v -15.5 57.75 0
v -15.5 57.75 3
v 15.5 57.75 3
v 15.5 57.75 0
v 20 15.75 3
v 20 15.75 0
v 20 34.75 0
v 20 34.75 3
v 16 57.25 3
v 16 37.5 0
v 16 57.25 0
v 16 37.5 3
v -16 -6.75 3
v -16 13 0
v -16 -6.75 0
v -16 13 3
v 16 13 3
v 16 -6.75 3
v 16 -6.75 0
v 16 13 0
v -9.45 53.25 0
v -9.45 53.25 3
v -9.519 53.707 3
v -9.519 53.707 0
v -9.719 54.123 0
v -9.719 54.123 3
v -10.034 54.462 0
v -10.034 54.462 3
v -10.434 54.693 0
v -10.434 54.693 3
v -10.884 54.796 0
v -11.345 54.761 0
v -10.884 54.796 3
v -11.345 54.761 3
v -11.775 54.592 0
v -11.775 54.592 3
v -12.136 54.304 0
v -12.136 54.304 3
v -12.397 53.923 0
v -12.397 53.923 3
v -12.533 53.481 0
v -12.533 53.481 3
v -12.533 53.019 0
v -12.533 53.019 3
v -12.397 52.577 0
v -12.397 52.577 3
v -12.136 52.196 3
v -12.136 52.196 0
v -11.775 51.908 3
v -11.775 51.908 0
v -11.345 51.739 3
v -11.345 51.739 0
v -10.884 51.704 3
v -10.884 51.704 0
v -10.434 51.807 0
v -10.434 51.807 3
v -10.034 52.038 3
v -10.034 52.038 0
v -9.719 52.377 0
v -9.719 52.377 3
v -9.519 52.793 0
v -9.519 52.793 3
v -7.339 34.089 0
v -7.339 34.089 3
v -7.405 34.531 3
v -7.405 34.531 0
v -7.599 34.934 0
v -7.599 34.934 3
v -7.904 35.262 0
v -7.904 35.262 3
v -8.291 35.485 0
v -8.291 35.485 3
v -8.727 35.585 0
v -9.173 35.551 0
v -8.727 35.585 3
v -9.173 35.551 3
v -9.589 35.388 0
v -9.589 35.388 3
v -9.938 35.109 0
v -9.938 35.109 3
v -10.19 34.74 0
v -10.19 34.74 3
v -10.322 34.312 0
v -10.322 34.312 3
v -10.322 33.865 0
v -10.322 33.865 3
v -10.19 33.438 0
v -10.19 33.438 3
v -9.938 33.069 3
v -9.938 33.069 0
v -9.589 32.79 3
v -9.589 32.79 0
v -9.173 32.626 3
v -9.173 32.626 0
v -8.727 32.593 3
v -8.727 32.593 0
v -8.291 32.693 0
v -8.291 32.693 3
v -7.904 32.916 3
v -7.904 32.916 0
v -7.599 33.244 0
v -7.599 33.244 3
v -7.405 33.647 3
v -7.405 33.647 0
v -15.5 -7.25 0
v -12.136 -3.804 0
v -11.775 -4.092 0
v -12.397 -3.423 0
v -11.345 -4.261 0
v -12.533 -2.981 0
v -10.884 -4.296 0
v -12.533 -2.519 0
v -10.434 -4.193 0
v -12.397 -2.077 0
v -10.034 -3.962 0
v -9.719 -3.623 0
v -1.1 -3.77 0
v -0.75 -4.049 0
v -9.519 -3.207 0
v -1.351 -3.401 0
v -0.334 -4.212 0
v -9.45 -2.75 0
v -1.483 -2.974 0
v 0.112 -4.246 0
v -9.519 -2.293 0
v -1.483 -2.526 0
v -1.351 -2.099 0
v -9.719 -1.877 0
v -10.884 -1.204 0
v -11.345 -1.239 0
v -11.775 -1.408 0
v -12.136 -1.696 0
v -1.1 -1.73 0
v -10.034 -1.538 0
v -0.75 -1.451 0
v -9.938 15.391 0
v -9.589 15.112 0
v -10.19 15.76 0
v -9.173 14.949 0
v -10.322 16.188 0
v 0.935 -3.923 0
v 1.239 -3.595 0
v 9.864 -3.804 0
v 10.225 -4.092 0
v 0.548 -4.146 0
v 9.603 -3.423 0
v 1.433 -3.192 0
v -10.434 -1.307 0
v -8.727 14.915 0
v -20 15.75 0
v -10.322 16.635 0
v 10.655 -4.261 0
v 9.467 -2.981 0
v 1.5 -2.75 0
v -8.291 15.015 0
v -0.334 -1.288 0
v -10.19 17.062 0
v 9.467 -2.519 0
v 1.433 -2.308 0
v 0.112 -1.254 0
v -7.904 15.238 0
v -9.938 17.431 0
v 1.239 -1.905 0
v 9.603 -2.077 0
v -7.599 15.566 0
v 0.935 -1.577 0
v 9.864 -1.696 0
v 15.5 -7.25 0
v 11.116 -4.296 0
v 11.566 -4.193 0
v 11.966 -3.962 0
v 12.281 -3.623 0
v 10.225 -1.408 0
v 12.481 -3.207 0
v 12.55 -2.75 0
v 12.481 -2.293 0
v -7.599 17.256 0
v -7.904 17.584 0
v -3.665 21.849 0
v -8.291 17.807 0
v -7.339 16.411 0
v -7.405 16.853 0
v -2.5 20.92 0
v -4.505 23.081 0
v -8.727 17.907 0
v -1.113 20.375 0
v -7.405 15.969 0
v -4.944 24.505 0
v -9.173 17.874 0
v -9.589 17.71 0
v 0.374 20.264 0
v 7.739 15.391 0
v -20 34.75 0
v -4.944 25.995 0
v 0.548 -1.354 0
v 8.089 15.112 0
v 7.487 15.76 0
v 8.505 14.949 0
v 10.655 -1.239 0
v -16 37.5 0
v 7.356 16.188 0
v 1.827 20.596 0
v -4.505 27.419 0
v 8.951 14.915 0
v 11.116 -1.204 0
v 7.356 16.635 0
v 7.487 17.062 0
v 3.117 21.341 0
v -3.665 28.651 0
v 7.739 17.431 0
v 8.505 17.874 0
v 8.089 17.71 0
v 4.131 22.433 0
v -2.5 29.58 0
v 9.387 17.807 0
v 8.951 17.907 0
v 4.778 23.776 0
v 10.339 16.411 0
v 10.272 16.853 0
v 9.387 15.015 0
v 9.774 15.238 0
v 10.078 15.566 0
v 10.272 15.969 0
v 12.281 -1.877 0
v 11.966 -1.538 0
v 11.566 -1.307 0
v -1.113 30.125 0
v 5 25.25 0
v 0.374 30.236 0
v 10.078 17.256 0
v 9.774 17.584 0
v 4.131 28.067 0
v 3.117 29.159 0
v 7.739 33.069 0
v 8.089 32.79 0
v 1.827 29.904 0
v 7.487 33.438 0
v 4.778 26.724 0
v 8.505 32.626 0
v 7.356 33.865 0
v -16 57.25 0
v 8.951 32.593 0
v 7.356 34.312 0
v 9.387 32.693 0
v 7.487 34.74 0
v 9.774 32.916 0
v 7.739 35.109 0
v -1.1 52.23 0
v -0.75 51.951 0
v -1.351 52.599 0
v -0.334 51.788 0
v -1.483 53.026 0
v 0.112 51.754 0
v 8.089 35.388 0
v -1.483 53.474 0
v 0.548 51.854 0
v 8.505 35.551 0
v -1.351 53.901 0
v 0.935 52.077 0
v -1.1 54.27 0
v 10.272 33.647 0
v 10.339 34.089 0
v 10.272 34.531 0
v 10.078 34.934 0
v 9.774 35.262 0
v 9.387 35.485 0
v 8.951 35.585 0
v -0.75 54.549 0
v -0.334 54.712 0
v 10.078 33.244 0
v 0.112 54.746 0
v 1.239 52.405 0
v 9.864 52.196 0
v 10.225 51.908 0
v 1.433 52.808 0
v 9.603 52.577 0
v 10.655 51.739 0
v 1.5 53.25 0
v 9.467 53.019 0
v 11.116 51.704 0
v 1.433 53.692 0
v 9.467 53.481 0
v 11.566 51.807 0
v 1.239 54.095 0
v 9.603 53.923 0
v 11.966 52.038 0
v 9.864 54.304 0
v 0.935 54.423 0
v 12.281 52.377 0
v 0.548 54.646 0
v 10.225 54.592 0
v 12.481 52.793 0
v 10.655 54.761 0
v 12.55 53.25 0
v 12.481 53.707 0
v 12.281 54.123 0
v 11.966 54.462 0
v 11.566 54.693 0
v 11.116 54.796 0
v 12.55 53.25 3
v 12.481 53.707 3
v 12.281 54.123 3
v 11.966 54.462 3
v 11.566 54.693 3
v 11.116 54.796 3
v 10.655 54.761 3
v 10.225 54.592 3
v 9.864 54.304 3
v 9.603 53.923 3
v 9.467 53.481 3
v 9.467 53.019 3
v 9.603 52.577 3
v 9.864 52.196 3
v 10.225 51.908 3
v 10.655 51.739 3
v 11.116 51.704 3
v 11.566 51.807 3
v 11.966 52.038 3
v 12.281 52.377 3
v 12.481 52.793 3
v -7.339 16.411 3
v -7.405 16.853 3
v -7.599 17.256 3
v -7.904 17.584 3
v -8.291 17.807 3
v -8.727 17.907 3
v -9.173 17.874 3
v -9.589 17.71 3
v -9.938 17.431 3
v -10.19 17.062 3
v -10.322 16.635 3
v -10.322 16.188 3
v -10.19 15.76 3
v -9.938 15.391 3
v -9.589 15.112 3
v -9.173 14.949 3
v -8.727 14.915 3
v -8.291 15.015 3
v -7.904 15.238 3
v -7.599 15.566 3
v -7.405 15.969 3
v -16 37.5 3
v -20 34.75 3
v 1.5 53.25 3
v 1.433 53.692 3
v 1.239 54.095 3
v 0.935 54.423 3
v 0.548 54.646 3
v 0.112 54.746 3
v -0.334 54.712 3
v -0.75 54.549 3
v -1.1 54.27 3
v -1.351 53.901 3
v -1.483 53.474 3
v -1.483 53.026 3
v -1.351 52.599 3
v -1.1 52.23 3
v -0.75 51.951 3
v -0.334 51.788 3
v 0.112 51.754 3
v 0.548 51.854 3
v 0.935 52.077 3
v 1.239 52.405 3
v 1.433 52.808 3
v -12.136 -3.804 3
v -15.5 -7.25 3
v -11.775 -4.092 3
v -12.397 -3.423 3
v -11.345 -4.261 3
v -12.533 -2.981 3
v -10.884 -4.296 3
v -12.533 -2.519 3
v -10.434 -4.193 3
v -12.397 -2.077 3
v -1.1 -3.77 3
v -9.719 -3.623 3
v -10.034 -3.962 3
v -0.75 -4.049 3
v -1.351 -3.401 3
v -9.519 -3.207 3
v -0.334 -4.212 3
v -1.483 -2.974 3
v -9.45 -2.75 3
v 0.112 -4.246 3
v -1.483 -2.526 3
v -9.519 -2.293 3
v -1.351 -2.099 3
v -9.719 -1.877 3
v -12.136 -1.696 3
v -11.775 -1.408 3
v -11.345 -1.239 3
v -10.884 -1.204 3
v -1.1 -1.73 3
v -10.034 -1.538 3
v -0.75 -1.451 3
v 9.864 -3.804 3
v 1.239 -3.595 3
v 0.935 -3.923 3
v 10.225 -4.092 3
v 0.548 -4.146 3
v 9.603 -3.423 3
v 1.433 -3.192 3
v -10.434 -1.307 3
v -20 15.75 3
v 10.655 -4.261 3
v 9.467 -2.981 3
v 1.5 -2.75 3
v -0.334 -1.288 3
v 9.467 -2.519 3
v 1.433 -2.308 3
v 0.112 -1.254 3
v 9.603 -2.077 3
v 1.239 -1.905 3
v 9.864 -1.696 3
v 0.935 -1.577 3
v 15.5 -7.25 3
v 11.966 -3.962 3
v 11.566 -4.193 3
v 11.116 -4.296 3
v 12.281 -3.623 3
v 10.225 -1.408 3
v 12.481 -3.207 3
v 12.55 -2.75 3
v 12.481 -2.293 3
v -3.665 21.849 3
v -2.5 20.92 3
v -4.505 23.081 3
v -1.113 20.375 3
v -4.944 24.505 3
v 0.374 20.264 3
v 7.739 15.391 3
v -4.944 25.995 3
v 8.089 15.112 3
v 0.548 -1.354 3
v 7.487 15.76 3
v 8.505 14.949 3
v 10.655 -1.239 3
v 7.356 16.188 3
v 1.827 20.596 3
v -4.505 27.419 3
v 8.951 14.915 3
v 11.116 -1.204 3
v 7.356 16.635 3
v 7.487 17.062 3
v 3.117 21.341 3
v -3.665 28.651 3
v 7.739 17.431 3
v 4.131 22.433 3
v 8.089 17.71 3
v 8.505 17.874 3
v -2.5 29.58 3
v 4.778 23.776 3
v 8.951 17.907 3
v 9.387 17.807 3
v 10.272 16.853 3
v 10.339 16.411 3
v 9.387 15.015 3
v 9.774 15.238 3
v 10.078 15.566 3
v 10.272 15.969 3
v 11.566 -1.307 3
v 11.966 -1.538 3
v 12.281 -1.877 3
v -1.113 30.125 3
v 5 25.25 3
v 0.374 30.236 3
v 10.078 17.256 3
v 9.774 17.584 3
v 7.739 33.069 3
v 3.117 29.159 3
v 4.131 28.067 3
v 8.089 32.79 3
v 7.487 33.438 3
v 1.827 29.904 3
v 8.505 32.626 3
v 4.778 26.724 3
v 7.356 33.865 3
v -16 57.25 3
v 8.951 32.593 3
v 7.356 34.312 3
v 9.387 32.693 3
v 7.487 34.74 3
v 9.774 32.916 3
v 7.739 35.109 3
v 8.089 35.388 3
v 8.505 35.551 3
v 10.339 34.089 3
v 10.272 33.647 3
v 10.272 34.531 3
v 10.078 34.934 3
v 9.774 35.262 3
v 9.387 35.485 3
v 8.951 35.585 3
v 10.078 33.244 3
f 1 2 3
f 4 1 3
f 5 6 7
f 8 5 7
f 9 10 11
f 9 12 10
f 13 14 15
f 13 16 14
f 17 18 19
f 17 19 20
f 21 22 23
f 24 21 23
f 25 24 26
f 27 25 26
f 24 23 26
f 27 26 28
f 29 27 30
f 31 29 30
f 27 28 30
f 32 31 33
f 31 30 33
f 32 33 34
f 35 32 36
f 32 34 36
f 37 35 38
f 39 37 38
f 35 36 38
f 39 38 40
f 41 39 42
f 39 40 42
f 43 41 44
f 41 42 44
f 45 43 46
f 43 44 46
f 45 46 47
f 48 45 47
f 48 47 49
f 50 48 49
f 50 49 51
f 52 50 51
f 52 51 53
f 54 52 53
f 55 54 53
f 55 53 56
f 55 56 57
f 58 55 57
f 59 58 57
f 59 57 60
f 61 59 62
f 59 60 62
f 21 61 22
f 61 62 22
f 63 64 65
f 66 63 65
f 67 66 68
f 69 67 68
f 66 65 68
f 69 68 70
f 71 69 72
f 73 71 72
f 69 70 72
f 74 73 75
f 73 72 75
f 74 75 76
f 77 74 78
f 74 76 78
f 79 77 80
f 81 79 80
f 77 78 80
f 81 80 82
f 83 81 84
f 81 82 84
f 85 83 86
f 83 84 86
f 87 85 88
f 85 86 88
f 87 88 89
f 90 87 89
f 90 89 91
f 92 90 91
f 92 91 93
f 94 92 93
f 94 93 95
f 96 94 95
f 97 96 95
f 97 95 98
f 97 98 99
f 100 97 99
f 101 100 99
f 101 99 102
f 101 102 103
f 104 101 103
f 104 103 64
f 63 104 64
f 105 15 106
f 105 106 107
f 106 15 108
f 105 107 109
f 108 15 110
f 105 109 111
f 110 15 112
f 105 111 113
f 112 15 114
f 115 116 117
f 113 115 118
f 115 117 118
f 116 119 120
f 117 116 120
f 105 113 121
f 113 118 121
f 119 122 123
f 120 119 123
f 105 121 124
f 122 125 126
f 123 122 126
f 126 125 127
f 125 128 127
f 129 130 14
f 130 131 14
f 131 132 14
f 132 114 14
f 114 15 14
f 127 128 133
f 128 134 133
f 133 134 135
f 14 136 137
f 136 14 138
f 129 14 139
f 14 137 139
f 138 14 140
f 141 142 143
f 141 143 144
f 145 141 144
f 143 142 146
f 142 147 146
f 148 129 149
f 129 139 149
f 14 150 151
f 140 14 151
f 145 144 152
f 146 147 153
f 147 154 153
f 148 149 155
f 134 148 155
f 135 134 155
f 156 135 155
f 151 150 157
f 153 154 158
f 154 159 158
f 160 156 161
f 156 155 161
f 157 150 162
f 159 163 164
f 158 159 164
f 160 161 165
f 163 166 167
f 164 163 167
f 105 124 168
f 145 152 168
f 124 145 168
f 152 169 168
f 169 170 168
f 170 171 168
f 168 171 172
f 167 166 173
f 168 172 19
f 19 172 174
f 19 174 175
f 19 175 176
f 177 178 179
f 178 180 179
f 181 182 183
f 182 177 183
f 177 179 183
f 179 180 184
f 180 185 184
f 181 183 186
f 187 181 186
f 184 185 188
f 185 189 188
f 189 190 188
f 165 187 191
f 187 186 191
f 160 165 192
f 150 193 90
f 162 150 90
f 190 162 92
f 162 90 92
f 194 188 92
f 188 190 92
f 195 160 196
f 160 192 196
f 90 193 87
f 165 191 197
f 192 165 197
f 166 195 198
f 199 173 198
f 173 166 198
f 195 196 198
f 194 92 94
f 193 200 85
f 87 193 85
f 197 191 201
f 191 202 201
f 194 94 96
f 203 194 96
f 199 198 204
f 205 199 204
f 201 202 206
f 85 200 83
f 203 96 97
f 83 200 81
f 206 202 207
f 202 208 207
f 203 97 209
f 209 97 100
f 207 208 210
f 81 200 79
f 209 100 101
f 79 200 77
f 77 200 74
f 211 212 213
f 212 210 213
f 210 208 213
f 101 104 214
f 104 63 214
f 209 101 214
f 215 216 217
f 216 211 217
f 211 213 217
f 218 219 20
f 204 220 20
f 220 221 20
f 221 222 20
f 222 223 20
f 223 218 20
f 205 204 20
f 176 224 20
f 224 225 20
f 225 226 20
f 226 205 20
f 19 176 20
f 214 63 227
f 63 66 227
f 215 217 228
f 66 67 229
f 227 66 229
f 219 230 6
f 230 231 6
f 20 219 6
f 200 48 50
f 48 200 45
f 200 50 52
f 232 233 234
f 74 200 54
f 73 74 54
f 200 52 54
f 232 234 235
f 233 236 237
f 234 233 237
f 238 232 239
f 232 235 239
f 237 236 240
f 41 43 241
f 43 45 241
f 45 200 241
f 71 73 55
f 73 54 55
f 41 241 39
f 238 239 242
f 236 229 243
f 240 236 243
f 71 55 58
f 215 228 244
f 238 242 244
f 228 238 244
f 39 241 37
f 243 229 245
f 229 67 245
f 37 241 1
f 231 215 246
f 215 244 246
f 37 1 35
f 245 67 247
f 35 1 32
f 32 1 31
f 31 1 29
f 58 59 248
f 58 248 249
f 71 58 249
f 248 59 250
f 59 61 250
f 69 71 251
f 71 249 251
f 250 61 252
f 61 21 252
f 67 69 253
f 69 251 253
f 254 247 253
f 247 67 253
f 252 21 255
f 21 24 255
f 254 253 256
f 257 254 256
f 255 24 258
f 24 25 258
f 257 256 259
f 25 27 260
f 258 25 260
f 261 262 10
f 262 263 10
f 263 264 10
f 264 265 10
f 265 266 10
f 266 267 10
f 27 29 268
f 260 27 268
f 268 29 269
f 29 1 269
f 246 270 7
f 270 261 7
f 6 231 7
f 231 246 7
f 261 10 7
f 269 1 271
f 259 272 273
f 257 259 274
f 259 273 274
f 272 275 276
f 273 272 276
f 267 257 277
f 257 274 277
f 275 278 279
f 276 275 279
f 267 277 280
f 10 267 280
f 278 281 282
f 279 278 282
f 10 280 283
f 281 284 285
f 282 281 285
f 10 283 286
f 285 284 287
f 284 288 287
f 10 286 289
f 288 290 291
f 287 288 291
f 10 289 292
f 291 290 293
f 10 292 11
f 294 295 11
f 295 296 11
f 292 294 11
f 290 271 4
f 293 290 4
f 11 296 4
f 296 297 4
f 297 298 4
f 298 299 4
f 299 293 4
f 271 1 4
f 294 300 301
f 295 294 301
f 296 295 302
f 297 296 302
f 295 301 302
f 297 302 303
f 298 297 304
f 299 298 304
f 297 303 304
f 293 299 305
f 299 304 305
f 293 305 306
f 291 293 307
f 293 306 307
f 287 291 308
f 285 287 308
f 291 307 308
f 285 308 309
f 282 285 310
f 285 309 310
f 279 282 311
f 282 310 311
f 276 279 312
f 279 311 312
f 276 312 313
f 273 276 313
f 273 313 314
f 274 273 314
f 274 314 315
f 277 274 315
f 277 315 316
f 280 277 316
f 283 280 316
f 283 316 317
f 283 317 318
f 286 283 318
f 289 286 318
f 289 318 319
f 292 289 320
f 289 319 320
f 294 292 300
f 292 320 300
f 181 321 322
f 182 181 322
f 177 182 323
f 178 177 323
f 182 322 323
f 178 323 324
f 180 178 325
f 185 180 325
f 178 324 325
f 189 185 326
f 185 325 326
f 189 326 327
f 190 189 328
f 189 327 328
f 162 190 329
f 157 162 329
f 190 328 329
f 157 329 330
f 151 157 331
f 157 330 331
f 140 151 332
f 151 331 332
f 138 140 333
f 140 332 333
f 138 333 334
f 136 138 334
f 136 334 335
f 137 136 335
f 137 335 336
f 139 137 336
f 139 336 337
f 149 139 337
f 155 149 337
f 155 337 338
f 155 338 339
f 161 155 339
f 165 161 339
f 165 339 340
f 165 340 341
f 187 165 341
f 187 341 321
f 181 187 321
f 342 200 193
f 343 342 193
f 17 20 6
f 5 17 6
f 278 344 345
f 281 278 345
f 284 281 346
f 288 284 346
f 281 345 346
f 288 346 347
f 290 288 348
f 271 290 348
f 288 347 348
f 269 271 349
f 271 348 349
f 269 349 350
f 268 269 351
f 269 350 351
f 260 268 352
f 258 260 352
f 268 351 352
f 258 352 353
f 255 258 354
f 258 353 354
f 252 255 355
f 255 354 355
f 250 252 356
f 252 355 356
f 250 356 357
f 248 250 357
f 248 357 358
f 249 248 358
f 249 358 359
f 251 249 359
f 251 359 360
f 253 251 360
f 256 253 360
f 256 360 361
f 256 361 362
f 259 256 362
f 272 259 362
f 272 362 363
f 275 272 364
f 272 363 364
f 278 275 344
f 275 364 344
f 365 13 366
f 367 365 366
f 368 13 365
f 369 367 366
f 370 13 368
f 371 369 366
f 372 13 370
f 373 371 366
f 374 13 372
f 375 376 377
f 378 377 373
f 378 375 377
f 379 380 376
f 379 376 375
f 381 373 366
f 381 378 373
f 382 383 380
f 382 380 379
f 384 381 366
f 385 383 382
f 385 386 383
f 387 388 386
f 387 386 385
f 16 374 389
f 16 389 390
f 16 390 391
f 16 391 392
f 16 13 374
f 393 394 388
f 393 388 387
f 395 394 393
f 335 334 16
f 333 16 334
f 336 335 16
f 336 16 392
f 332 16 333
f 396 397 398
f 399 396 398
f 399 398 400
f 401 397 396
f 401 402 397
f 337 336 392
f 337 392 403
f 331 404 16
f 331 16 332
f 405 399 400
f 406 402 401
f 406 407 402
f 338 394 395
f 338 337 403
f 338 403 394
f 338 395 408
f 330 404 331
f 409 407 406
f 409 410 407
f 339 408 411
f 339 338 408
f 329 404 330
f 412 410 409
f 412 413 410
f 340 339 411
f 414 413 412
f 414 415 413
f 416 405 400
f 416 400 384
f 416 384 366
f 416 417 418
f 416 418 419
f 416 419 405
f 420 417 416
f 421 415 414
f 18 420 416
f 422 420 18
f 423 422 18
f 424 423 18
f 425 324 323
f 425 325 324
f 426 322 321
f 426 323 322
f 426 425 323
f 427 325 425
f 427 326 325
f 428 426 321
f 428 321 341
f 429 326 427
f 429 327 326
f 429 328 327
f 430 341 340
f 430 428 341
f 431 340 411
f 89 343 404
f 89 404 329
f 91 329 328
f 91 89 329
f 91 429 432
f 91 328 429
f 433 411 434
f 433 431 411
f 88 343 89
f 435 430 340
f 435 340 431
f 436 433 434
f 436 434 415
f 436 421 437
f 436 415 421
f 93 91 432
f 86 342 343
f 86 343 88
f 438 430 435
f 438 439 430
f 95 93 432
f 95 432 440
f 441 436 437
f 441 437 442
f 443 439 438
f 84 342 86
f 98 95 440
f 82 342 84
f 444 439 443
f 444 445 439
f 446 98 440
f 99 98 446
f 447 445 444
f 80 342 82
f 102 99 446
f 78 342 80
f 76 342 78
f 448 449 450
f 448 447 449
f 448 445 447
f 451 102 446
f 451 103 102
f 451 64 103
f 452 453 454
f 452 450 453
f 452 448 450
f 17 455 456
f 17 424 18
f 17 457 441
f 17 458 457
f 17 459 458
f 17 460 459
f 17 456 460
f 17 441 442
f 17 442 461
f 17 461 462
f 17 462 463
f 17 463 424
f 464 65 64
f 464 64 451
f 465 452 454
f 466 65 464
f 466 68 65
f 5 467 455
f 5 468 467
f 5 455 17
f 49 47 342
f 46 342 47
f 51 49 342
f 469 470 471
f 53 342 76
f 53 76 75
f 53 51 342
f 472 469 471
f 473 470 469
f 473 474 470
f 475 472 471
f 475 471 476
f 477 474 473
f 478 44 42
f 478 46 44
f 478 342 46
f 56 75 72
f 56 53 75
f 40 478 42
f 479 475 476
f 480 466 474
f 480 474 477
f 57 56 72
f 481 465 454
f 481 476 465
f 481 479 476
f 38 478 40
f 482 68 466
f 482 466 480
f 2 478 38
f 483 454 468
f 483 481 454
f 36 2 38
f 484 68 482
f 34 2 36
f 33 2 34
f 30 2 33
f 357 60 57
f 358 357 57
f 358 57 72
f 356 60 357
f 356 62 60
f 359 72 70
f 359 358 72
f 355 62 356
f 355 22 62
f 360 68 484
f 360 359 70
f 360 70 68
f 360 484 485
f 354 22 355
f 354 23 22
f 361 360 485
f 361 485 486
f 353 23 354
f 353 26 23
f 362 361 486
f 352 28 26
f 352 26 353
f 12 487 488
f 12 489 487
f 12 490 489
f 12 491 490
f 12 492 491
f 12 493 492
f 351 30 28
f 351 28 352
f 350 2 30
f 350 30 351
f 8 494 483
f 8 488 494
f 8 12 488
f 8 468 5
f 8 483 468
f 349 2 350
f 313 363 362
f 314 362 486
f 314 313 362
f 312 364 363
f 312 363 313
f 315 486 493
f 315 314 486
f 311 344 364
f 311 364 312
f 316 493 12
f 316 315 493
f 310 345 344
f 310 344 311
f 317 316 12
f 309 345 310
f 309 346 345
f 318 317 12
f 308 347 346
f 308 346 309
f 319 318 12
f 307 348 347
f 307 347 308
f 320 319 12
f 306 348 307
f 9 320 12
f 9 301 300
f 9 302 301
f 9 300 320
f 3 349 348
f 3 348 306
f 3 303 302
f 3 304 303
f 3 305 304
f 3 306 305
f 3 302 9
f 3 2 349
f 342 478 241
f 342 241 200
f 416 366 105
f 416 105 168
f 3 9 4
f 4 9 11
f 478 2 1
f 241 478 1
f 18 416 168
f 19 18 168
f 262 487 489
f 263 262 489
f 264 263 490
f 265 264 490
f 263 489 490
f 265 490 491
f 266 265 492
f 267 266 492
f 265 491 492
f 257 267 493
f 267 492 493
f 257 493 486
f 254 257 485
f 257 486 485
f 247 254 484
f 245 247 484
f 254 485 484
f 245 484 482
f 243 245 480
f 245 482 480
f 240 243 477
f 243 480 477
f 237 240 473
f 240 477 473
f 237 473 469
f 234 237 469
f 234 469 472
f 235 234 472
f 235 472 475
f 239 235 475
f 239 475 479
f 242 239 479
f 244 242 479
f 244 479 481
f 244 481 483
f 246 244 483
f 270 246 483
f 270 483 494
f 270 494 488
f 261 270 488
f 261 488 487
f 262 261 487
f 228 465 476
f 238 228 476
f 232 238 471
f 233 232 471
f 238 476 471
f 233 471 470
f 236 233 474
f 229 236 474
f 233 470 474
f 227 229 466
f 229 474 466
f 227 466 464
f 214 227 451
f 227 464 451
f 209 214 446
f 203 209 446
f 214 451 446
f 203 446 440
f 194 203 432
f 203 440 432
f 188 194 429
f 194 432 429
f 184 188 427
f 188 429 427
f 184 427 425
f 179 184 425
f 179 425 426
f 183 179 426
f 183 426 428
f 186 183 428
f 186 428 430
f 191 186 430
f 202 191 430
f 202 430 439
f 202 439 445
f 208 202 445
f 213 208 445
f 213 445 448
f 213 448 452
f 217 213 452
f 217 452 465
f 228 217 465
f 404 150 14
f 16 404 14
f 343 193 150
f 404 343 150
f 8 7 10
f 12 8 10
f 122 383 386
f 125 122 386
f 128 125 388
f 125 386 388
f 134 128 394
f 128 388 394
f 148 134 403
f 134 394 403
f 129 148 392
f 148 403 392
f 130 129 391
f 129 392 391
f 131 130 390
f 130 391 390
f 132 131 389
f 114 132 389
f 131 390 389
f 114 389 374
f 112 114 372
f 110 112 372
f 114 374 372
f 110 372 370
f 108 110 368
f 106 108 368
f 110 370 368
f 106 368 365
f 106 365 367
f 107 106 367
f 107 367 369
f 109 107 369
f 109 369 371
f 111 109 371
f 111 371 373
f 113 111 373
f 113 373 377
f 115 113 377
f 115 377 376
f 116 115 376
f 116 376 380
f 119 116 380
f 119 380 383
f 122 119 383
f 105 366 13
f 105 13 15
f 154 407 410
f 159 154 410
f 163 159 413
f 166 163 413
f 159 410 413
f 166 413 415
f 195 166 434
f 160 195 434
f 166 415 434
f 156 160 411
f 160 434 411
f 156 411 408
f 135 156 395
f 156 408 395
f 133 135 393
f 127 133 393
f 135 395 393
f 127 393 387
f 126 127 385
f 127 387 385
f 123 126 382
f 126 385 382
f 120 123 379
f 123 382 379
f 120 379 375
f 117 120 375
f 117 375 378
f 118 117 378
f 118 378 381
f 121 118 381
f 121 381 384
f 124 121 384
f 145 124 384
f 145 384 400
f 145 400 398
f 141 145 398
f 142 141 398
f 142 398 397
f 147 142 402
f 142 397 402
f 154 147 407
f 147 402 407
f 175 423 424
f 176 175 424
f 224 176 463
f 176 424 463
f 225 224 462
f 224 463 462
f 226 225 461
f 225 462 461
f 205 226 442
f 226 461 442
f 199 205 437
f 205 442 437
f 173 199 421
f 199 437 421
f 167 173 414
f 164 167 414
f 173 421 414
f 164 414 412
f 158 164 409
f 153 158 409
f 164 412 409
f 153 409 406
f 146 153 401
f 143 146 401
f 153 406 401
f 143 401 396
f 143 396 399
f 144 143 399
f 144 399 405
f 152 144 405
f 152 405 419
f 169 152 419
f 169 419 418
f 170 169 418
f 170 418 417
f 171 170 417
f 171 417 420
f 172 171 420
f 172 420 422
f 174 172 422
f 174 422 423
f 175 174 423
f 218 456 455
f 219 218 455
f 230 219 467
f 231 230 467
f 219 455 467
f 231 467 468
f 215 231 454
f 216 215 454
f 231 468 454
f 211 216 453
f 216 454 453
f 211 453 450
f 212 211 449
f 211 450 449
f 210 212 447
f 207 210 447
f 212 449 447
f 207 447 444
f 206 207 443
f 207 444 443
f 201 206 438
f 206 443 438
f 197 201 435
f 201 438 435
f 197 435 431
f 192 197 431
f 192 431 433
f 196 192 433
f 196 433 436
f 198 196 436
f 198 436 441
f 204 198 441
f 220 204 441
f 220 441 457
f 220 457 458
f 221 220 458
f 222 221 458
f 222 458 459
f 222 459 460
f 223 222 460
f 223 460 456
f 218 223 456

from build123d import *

# Parameters (mm, degrees)
IZIM1_R                      = 1
Y_KSEKLIK_EKSTR_ZYON1_DEPTH  = 3
KES_EKSTR_ZYON1_DEPTH        = 10
Y_KSEKLIK_EKSTR_ZYON2_DEPTH  = 3
IZIM6_R                      = 1.55
Y_KSEKLIK_EKSTR_ZYON4_DEPTH  = 3
IZIM9_W                      = 2.764853826
IZIM9_H                      = 2.899724745
IZIM9_W_2                    = 2.53555673
IZIM9_H_2                    = 2.630505748
Y_KSEKLIK_EKSTR_ZYON5_DEPTH  = 3
IZIM8_R                      = 1.55
Y_KSEKLIK_EKSTR_ZYON6_DEPTH  = 3
IZIM10_R                     = 1.55
KES_EKSTR_ZYON2_DEPTH        = 10
IZIM14_R                     = 1.5
KES_EKSTR_ZYON3_DEPTH        = 10
IZIM15_R                     = 5
KES_EKSTR_ZYON4_DEPTH        = 10
Y_KSEKLIK_EKSTR_ZYON7_DEPTH  = 3
KES_EKSTR_ZYON5_DEPTH        = 3
IZIM23_R                     = 1.55
KES_EKSTR_ZYON6_DEPTH        = 3
IZIM25_R                     = 1.5
KES_EKSTR_ZYON7_DEPTH        = 3
Y_KSEKLIK_EKSTR_ZYON8_DEPTH  = 3
IZIM27_W                     = 26
IZIM27_H                     = 10
Y_KSEKLIK_EKSTR_ZYON9_DEPTH  = 3
IZIM28_W                     = 32
IZIM28_H                     = 10.183470431
KES_EKSTR_ZYON8_DEPTH        = 10
IZIM29_W                     = 21.597894427
IZIM29_H                     = 9.610197834
Y_KSEKLIK_EKSTR_ZYON11_DEPTH = 3
IZIM30_W                     = 32
IZIM30_H                     = 0.75
IZIM30_H_2                   = 0.5
KES_EKSTR_ZYON9_DEPTH        = 10
PAH1_SIZE                    = 0.5


with BuildPart() as part:
    # Çizim1 → Yükseklik-Ekstrüzyon1 (new body)
    # profile 1 of 2: a face of its own
    with BuildSketch(Plane.XY):
        Polygon((7.5, 49.5), (0, 49.5), (0, 46.25495549), (3, 46.25495549), (3.494974747, 46.749930237), (5.494974747, 46.749930237), (8.5, 44.749930237), (8.5, 43.249930237), (8.5, 41.749930237), (5.494974747, 39.749930237), (3.494974747, 39.749930237), (3, 40.244904984), (0, 40.244904984), (0, -51.5), (8.5, -51.5), (13.25, -48.202566926), (13.25, -43.75), (12.5, -43), (12.5, -35), (13.25, -34.25), (13.25, -28.25), (12.5, -27.5), (12.5, -19.5), (13.25, -18.75), (13.25, -12.75), (12.5, -12), (12.5, -4), (14, -2.5), (14, -2), (16, 0), (16, 13), (20, 15.75), (20, 33.5), (20, 34.75), (16, 37.5), (16, 47.5), (12, 51.5), (9.5, 51.5), align=None)
        Polygon((2.624434095, -42.600069763), (3.119408841, -42.105095016), (3.119408841, -36.105095016), (2.624434095, -35.610120269), (2.624434095, -33.610120269), (4.624434095, -30.605095016), (6.124434095, -30.605095016), (7.624434095, -30.605095016), (9.624434095, -33.610120269), (9.624434095, -35.610120269), (9.129459348, -36.105095016), (9.129459348, -42.105095016), (9.624434095, -42.600069763), (9.624434095, -44.600069763), (7.624434095, -47.605095016), (6.124434095, -47.605095016), (4.624434095, -47.605095016), (2.624434095, -44.600069763), align=None, mode=Mode.SUBTRACT)
        Polygon((4.624434095, -7.305095016), (6.124434095, -7.305095016), (7.624434095, -7.305095016), (9.624434095, -10.310120269), (9.624434095, -12.310120269), (9.129459348, -12.805095016), (9.129459348, -18.805095016), (9.624434095, -19.300069763), (9.624434095, -21.300069763), (7.624434095, -24.305095016), (6.124434095, -24.305095016), (4.624434095, -24.305095016), (2.624434095, -21.300069763), (2.624434095, -19.300069763), (3.119408841, -18.805095016), (3.119408841, -12.805095016), (2.624434095, -12.310120269), (2.624434095, -10.310120269), align=None, mode=Mode.SUBTRACT)
        with Locations((11, -0.75)):
            Circle(IZIM1_R, mode=Mode.SUBTRACT)
        with Locations((11, 48.25)):
            Circle(IZIM1_R, mode=Mode.SUBTRACT)
    # profile 2 of 2: a face of its own
    with BuildSketch(Plane.XY):
        Polygon((-9.5, 51.5), (-12, 51.5), (-16, 47.5), (-16, 37.5), (-20, 34.75), (-20, 33.5), (-20, 15.75), (-16, 13), (-16, 0), (-14, -2), (-14, -2.5), (-12.5, -4), (-12.5, -12), (-13.25, -12.75), (-13.25, -18.75), (-12.5, -19.5), (-12.5, -27.5), (-13.25, -28.25), (-13.25, -34.25), (-12.5, -35), (-12.5, -43), (-13.25, -43.75), (-13.25, -48.202566926), (-8.5, -51.5), (0, -51.5), (0, 40.244904984), (-3, 40.244904984), (-3.494974747, 39.749930237), (-5.494974747, 39.749930237), (-8.5, 41.749930237), (-8.5, 43.249930237), (-8.5, 44.749930237), (-5.494974747, 46.749930237), (-3.494974747, 46.749930237), (-3, 46.25495549), (0, 46.25495549), (0, 49.5), (-7.5, 49.5), align=None)
        Polygon((-2.624434095, -35.610120269), (-3.119408841, -36.105095016), (-3.119408841, -42.105095016), (-2.624434095, -42.600069763), (-2.624434095, -44.600069763), (-4.624434095, -47.605095016), (-6.124434095, -47.605095016), (-7.624434095, -47.605095016), (-9.624434095, -44.600069763), (-9.624434095, -42.600069763), (-9.129459348, -42.105095016), (-9.129459348, -36.105095016), (-9.624434095, -35.610120269), (-9.624434095, -33.610120269), (-7.624434095, -30.605095016), (-6.124434095, -30.605095016), (-4.624434095, -30.605095016), (-2.624434095, -33.610120269), align=None, mode=Mode.SUBTRACT)
        with Locations((-11, -0.75)):
            Circle(IZIM1_R, mode=Mode.SUBTRACT)
        Polygon((-3.119408841, -18.805095016), (-2.624434095, -19.300069763), (-2.624434095, -21.300069763), (-4.624434095, -24.305095016), (-6.124434095, -24.305095016), (-7.624434095, -24.305095016), (-9.624434095, -21.300069763), (-9.624434095, -19.300069763), (-9.129459348, -18.805095016), (-9.129459348, -12.805095016), (-9.624434095, -12.310120269), (-9.624434095, -10.310120269), (-7.624434095, -7.305095016), (-6.124434095, -7.305095016), (-4.624434095, -7.305095016), (-2.624434095, -10.310120269), (-2.624434095, -12.310120269), (-3.119408841, -12.805095016), align=None, mode=Mode.SUBTRACT)
        with Locations((-11, 48.25)):
            Circle(IZIM1_R, mode=Mode.SUBTRACT)
    extrude(amount=Y_KSEKLIK_EKSTR_ZYON1_DEPTH)

    # Çizim2 → Kes-Ekstrüzyon1 (cut)
    with BuildSketch(Plane.XY.offset(3)):
        Polygon((-12.5, -4), (12.5, -4), (38.548396408, -28.529419771), (17.359301926, -71.305004234), (-44.147930668, -53.058839542), align=None)
    extrude(amount=-KES_EKSTR_ZYON1_DEPTH, mode=Mode.SUBTRACT)

    # Çizim3 → Yükseklik-Ekstrüzyon2 (add)
    with BuildSketch(Plane.XY.offset(3)):
        Polygon((9.5, 51.5), (-9.5, 51.5), (-7.5, 49.5), (7.5, 49.5), align=None)
    extrude(amount=-Y_KSEKLIK_EKSTR_ZYON2_DEPTH)

    # Çizim6 → Yükseklik-Ekstrüzyon4 (add)
    with BuildSketch(Plane.XY.offset(3)):
        Polygon((-16, 47.5), (-16, 54.5), (-12, 58.5), (12, 58.5), (16, 54.5), (16, 47.5), (12.510789388, 45.937791763), (6.230146787, 48.369008254), (-4.136290194, 49.078113063), (-9.944196255, 45.397521432), align=None)
        with Locations((11, 53.25)):
            Circle(IZIM6_R, mode=Mode.SUBTRACT)
        with Locations((-11, 53.25)):
            Circle(IZIM6_R, mode=Mode.SUBTRACT)
    extrude(amount=-Y_KSEKLIK_EKSTR_ZYON4_DEPTH)

    # Çizim9 → Yükseklik-Ekstrüzyon5 (add)
    with BuildSketch(Plane.XY.offset(3)):
        with Locations((-10.828696241, -0.299998429)):
            Rectangle(IZIM9_W, IZIM9_H)
        with Locations((11.040614903, -0.603719415)):
            Rectangle(IZIM9_W_2, IZIM9_H_2)
    extrude(amount=-Y_KSEKLIK_EKSTR_ZYON5_DEPTH)

    # Çizim8 → Yükseklik-Ekstrüzyon6 (add)
    with BuildSketch(Plane.XY.offset(3)):
        Polygon((-16, 0), (-16, -2), (-12.5, -6), (12.5, -6), (16, -2), (16, 0), (12.001079667, 1.705733335), (6.853090616, -1.163543143), (-3.589444332, -1.163543143), (-11.459943544, 2.530439958), align=None)
        with Locations((-11, -2.75)):
            Circle(IZIM8_R, mode=Mode.SUBTRACT)
        with Locations((11, -2.75)):
            Circle(IZIM8_R, mode=Mode.SUBTRACT)
    extrude(amount=-Y_KSEKLIK_EKSTR_ZYON6_DEPTH)

    # Çizim10 → Kes-Ekstrüzyon2 (cut)
    with BuildSketch(Plane.XY.offset(3)):
        with Locations((-11, -2.75)):
            Circle(IZIM10_R)
        with Locations((11, -2.75)):
            Circle(IZIM10_R)
    extrude(amount=-KES_EKSTR_ZYON2_DEPTH, mode=Mode.SUBTRACT)

    # Çizim14 → Kes-Ekstrüzyon3 (cut)
    with BuildSketch(Plane.XY.offset(3)):
        with Locations((8.838834765, 34.088834765)):
            Circle(IZIM14_R)
        with Locations((-8.838834765, 16.411165235)):
            Circle(IZIM14_R)
        with Locations((8.838834765, 16.411165235)):
            Circle(IZIM14_R)
        with Locations((-8.838834765, 34.088834765)):
            Circle(IZIM14_R)
    extrude(amount=-KES_EKSTR_ZYON3_DEPTH, mode=Mode.SUBTRACT)

    # Çizim15 → Kes-Ekstrüzyon4 (cut)
    with BuildSketch(Plane.XY.offset(3)):
        with Locations((0, 25.25)):
            Circle(IZIM15_R)
    extrude(amount=-KES_EKSTR_ZYON4_DEPTH, mode=Mode.SUBTRACT)

    # Çizim19 → Yükseklik-Ekstrüzyon7 (add)
    with BuildSketch(Plane.XY.offset(3)):
        Polygon((-16, -13), (-12, -17), (12, -17), (16, -13), (16, -2), (-16, -2), align=None)
    extrude(amount=-Y_KSEKLIK_EKSTR_ZYON7_DEPTH)

    # Çizim22 → Kes-Ekstrüzyon5 (cut)
    with BuildSketch(Plane.XY.offset(3)):
        Polygon((3, -7.610667932), (3.494974747, -7.115693185), (5.494974747, -7.115693185), (8.5, -9.115693185), (8.5, -12.115693185), (5.494974747, -14.115693185), (3.494974747, -14.115693185), (3, -13.620718438), (-3, -13.620718438), (-3.494974747, -14.115693185), (-5.494974747, -14.115693185), (-8.5, -12.115693185), (-8.5, -9.115693185), (-5.494974747, -7.115693185), (-3.494974747, -7.115693185), (-3, -7.610667932), align=None)
    extrude(amount=-KES_EKSTR_ZYON5_DEPTH, mode=Mode.SUBTRACT)

    # Çizim23 → Kes-Ekstrüzyon6 (cut)
    with BuildSketch(Plane.XY.offset(3)):
        with Locations((-11, -2.75)):
            Circle(IZIM23_R)
        with Locations((11, -2.75)):
            Circle(IZIM23_R)
    extrude(amount=-KES_EKSTR_ZYON6_DEPTH, mode=Mode.SUBTRACT)

    # Çizim25 → Kes-Ekstrüzyon7 (cut)
    with BuildSketch(Plane.XY.offset(3)):
        with Locations((0, -2.75)):
            Circle(IZIM25_R)
        with Locations((0, 53.25)):
            Circle(IZIM25_R)
    extrude(amount=-KES_EKSTR_ZYON7_DEPTH, mode=Mode.SUBTRACT)

    # Çizim26 → Yükseklik-Ekstrüzyon8 (add)
    with BuildSketch(Plane.XY.offset(3)):
        Polygon((-16, 54.5), (-12, 58.5), (-16, 58.5), align=None)
        Polygon((12, 58.5), (16, 54.5), (16, 58.5), align=None)
    extrude(amount=-Y_KSEKLIK_EKSTR_ZYON8_DEPTH)

    # Çizim27 → Yükseklik-Ekstrüzyon9 (add)
    with BuildSketch(Plane.XY.offset(3)):
        with Locations((-1, -12)):
            Rectangle(IZIM27_W, IZIM27_H)
    extrude(amount=-Y_KSEKLIK_EKSTR_ZYON9_DEPTH)

    # Çizim28 → Kes-Ekstrüzyon8 (cut)
    with BuildSketch(Plane.XY.offset(3)):
        with Locations((0, -12.841735215)):
            Rectangle(IZIM28_W, IZIM28_H)
    extrude(amount=-KES_EKSTR_ZYON8_DEPTH, mode=Mode.SUBTRACT)

    # Çizim29 → Yükseklik-Ekstrüzyon11 (add)
    with BuildSketch(Plane.XY.offset(3)):
        with Locations((0.687303888, 43.184879182)):
            Rectangle(IZIM29_W, IZIM29_H)
    extrude(amount=-Y_KSEKLIK_EKSTR_ZYON11_DEPTH)

    # Çizim30 → Kes-Ekstrüzyon9 (cut)
    with BuildSketch(Plane.XY.offset(3)):
        with Locations((0, 58.125)):
            Rectangle(IZIM30_W, IZIM30_H)
        with Locations((0, -7.5)):
            Rectangle(IZIM30_W, IZIM30_H_2)
    extrude(amount=-KES_EKSTR_ZYON9_DEPTH, mode=Mode.SUBTRACT)

    # Pah1
    pah1_edges = [part.edges().sort_by_distance(p)[0] for p in [
        (16, 57.75, 1.5),
        (-16, 57.75, 1.5),
        (-16, -7.25, 1.5),
        (16, -7.25, 1.5),
    ]]
    chamfer(pah1_edges, length=PAH1_SIZE)


solid = part.part
